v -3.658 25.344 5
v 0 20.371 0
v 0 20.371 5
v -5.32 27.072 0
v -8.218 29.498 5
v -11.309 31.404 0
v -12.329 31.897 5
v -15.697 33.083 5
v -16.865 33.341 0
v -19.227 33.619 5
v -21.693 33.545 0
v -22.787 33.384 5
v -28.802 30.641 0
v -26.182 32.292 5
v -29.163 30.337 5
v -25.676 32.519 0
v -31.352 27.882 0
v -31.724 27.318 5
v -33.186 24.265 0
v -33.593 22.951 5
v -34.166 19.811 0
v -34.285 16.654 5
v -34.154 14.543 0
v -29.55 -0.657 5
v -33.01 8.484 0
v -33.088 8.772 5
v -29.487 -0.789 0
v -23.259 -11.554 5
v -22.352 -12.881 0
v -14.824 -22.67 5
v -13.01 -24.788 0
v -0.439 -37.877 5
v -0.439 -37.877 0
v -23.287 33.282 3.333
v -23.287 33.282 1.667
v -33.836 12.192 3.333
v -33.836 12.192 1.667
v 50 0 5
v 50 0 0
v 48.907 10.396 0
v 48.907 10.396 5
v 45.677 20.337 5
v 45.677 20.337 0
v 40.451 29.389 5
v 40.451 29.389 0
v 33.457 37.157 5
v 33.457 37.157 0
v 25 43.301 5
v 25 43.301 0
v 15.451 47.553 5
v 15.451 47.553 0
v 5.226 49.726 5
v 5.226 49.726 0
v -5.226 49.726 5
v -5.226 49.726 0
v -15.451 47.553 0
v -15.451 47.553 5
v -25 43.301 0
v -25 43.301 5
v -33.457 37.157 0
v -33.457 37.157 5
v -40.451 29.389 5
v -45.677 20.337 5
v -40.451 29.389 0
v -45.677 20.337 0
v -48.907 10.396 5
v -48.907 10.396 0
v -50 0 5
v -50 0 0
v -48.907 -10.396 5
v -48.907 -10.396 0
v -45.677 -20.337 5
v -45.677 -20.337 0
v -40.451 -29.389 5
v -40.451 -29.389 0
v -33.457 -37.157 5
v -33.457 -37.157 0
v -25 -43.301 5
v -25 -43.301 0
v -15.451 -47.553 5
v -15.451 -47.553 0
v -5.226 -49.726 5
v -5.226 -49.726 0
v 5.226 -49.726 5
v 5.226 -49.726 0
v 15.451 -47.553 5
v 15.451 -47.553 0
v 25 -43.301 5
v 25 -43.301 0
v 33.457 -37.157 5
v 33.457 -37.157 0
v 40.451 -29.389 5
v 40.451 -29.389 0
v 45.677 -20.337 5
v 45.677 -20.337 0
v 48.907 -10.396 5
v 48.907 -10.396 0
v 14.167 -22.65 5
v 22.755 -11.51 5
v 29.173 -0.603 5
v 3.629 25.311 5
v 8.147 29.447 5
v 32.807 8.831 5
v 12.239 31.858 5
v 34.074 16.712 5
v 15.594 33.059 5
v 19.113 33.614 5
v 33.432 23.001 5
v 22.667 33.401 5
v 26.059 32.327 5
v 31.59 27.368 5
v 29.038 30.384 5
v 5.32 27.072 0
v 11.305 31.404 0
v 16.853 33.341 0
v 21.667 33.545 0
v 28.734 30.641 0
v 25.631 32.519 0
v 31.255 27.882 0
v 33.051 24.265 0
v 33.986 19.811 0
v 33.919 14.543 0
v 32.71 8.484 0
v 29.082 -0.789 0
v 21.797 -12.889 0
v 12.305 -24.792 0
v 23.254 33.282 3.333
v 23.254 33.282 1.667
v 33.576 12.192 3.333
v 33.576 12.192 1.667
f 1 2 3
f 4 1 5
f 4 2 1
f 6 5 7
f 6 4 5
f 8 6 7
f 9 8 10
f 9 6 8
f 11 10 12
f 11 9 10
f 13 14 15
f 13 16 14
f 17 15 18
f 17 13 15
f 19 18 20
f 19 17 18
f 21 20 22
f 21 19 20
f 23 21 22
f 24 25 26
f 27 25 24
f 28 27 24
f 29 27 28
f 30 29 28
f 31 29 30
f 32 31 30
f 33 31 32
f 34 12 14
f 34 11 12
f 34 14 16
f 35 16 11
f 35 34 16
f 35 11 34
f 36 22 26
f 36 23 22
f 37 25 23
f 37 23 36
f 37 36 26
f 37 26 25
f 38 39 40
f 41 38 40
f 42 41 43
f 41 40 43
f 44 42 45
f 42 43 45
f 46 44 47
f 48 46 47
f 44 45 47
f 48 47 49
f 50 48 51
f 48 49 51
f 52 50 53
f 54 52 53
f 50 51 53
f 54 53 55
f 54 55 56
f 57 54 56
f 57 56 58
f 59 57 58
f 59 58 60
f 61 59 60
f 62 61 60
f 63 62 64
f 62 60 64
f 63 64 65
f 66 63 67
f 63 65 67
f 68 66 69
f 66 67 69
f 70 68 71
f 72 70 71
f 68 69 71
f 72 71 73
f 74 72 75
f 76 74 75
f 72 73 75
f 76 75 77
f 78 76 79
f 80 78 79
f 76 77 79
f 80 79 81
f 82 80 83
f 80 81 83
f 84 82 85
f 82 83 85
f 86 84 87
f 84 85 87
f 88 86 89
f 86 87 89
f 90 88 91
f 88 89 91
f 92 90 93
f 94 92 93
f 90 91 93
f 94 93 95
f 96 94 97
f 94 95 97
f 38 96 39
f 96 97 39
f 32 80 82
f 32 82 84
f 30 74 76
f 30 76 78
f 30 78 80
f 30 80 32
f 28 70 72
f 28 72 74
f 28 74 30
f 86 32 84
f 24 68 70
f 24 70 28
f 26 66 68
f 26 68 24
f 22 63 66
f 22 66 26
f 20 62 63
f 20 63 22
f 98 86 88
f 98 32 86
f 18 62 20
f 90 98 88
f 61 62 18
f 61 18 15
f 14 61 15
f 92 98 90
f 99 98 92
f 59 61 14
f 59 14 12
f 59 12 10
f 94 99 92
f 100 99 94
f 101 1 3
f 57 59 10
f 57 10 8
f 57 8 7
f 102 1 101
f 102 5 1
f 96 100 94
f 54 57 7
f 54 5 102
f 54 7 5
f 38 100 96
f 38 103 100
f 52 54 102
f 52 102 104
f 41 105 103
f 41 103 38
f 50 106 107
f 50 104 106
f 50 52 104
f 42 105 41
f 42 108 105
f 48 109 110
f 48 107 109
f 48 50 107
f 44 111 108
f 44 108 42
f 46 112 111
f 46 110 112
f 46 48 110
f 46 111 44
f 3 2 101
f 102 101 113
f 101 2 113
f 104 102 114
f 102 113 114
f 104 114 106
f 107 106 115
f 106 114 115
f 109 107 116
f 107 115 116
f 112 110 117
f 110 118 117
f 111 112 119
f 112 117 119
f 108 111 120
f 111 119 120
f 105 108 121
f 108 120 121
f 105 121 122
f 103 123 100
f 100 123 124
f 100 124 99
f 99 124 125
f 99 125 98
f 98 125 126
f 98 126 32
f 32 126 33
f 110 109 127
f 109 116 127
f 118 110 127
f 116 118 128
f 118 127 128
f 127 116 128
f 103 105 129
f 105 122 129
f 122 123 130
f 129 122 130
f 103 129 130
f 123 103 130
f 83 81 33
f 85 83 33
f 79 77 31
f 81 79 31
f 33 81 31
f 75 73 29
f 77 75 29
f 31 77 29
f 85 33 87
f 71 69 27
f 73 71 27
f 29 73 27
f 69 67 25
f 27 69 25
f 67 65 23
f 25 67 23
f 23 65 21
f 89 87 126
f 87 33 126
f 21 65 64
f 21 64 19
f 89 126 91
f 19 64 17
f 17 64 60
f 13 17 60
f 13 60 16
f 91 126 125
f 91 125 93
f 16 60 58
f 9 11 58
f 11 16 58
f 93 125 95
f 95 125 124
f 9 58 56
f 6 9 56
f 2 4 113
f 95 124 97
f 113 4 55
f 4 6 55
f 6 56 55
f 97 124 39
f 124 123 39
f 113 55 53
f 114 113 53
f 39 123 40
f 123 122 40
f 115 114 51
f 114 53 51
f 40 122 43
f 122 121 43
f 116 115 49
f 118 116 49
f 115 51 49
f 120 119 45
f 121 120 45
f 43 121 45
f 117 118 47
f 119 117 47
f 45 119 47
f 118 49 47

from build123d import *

# Parameters (mm, degrees)
EXTRUDE_DEPTH      = 6
EXTRUDE_DEPTH_BACK = 1
CYLINDER_R         = 50
CYLINDER_DEPTH     = 5


with BuildPart() as extrude_body:
    # Sketch → Extrude (new body, two sides)
    with BuildSketch(Plane.XY) as extrude_sk:
        with BuildLine():
            add(Edge.make_bspline(
                [(0, 20.3714), (-19.252262, 51.958269), (-66.21259, 25.005477), (-0.43936, -37.8768)],
                knots=[0, 0, 0, 0, 1, 1, 1, 1], degree=3))
            add(Edge.make_bspline(
                [(0, 20.3714), (19.252262, 51.958269), (66.21259, 25.005477), (-0.43936, -37.8768)],
                knots=[0, 0, 0, 0, 1, 1, 1, 1], degree=3))
        make_face()
    extrude(amount=EXTRUDE_DEPTH)
    extrude(extrude_sk.sketch, amount=-EXTRUDE_DEPTH_BACK)


with BuildPart() as cut:
    # Cylinder → Cylinder (new body)
    with BuildSketch(Plane.XY):
        Circle(CYLINDER_R)
    extrude(amount=CYLINDER_DEPTH)

    # Cut: cut Extrude body
    add(extrude_body.part, mode=Mode.SUBTRACT)


solid = cut.part
